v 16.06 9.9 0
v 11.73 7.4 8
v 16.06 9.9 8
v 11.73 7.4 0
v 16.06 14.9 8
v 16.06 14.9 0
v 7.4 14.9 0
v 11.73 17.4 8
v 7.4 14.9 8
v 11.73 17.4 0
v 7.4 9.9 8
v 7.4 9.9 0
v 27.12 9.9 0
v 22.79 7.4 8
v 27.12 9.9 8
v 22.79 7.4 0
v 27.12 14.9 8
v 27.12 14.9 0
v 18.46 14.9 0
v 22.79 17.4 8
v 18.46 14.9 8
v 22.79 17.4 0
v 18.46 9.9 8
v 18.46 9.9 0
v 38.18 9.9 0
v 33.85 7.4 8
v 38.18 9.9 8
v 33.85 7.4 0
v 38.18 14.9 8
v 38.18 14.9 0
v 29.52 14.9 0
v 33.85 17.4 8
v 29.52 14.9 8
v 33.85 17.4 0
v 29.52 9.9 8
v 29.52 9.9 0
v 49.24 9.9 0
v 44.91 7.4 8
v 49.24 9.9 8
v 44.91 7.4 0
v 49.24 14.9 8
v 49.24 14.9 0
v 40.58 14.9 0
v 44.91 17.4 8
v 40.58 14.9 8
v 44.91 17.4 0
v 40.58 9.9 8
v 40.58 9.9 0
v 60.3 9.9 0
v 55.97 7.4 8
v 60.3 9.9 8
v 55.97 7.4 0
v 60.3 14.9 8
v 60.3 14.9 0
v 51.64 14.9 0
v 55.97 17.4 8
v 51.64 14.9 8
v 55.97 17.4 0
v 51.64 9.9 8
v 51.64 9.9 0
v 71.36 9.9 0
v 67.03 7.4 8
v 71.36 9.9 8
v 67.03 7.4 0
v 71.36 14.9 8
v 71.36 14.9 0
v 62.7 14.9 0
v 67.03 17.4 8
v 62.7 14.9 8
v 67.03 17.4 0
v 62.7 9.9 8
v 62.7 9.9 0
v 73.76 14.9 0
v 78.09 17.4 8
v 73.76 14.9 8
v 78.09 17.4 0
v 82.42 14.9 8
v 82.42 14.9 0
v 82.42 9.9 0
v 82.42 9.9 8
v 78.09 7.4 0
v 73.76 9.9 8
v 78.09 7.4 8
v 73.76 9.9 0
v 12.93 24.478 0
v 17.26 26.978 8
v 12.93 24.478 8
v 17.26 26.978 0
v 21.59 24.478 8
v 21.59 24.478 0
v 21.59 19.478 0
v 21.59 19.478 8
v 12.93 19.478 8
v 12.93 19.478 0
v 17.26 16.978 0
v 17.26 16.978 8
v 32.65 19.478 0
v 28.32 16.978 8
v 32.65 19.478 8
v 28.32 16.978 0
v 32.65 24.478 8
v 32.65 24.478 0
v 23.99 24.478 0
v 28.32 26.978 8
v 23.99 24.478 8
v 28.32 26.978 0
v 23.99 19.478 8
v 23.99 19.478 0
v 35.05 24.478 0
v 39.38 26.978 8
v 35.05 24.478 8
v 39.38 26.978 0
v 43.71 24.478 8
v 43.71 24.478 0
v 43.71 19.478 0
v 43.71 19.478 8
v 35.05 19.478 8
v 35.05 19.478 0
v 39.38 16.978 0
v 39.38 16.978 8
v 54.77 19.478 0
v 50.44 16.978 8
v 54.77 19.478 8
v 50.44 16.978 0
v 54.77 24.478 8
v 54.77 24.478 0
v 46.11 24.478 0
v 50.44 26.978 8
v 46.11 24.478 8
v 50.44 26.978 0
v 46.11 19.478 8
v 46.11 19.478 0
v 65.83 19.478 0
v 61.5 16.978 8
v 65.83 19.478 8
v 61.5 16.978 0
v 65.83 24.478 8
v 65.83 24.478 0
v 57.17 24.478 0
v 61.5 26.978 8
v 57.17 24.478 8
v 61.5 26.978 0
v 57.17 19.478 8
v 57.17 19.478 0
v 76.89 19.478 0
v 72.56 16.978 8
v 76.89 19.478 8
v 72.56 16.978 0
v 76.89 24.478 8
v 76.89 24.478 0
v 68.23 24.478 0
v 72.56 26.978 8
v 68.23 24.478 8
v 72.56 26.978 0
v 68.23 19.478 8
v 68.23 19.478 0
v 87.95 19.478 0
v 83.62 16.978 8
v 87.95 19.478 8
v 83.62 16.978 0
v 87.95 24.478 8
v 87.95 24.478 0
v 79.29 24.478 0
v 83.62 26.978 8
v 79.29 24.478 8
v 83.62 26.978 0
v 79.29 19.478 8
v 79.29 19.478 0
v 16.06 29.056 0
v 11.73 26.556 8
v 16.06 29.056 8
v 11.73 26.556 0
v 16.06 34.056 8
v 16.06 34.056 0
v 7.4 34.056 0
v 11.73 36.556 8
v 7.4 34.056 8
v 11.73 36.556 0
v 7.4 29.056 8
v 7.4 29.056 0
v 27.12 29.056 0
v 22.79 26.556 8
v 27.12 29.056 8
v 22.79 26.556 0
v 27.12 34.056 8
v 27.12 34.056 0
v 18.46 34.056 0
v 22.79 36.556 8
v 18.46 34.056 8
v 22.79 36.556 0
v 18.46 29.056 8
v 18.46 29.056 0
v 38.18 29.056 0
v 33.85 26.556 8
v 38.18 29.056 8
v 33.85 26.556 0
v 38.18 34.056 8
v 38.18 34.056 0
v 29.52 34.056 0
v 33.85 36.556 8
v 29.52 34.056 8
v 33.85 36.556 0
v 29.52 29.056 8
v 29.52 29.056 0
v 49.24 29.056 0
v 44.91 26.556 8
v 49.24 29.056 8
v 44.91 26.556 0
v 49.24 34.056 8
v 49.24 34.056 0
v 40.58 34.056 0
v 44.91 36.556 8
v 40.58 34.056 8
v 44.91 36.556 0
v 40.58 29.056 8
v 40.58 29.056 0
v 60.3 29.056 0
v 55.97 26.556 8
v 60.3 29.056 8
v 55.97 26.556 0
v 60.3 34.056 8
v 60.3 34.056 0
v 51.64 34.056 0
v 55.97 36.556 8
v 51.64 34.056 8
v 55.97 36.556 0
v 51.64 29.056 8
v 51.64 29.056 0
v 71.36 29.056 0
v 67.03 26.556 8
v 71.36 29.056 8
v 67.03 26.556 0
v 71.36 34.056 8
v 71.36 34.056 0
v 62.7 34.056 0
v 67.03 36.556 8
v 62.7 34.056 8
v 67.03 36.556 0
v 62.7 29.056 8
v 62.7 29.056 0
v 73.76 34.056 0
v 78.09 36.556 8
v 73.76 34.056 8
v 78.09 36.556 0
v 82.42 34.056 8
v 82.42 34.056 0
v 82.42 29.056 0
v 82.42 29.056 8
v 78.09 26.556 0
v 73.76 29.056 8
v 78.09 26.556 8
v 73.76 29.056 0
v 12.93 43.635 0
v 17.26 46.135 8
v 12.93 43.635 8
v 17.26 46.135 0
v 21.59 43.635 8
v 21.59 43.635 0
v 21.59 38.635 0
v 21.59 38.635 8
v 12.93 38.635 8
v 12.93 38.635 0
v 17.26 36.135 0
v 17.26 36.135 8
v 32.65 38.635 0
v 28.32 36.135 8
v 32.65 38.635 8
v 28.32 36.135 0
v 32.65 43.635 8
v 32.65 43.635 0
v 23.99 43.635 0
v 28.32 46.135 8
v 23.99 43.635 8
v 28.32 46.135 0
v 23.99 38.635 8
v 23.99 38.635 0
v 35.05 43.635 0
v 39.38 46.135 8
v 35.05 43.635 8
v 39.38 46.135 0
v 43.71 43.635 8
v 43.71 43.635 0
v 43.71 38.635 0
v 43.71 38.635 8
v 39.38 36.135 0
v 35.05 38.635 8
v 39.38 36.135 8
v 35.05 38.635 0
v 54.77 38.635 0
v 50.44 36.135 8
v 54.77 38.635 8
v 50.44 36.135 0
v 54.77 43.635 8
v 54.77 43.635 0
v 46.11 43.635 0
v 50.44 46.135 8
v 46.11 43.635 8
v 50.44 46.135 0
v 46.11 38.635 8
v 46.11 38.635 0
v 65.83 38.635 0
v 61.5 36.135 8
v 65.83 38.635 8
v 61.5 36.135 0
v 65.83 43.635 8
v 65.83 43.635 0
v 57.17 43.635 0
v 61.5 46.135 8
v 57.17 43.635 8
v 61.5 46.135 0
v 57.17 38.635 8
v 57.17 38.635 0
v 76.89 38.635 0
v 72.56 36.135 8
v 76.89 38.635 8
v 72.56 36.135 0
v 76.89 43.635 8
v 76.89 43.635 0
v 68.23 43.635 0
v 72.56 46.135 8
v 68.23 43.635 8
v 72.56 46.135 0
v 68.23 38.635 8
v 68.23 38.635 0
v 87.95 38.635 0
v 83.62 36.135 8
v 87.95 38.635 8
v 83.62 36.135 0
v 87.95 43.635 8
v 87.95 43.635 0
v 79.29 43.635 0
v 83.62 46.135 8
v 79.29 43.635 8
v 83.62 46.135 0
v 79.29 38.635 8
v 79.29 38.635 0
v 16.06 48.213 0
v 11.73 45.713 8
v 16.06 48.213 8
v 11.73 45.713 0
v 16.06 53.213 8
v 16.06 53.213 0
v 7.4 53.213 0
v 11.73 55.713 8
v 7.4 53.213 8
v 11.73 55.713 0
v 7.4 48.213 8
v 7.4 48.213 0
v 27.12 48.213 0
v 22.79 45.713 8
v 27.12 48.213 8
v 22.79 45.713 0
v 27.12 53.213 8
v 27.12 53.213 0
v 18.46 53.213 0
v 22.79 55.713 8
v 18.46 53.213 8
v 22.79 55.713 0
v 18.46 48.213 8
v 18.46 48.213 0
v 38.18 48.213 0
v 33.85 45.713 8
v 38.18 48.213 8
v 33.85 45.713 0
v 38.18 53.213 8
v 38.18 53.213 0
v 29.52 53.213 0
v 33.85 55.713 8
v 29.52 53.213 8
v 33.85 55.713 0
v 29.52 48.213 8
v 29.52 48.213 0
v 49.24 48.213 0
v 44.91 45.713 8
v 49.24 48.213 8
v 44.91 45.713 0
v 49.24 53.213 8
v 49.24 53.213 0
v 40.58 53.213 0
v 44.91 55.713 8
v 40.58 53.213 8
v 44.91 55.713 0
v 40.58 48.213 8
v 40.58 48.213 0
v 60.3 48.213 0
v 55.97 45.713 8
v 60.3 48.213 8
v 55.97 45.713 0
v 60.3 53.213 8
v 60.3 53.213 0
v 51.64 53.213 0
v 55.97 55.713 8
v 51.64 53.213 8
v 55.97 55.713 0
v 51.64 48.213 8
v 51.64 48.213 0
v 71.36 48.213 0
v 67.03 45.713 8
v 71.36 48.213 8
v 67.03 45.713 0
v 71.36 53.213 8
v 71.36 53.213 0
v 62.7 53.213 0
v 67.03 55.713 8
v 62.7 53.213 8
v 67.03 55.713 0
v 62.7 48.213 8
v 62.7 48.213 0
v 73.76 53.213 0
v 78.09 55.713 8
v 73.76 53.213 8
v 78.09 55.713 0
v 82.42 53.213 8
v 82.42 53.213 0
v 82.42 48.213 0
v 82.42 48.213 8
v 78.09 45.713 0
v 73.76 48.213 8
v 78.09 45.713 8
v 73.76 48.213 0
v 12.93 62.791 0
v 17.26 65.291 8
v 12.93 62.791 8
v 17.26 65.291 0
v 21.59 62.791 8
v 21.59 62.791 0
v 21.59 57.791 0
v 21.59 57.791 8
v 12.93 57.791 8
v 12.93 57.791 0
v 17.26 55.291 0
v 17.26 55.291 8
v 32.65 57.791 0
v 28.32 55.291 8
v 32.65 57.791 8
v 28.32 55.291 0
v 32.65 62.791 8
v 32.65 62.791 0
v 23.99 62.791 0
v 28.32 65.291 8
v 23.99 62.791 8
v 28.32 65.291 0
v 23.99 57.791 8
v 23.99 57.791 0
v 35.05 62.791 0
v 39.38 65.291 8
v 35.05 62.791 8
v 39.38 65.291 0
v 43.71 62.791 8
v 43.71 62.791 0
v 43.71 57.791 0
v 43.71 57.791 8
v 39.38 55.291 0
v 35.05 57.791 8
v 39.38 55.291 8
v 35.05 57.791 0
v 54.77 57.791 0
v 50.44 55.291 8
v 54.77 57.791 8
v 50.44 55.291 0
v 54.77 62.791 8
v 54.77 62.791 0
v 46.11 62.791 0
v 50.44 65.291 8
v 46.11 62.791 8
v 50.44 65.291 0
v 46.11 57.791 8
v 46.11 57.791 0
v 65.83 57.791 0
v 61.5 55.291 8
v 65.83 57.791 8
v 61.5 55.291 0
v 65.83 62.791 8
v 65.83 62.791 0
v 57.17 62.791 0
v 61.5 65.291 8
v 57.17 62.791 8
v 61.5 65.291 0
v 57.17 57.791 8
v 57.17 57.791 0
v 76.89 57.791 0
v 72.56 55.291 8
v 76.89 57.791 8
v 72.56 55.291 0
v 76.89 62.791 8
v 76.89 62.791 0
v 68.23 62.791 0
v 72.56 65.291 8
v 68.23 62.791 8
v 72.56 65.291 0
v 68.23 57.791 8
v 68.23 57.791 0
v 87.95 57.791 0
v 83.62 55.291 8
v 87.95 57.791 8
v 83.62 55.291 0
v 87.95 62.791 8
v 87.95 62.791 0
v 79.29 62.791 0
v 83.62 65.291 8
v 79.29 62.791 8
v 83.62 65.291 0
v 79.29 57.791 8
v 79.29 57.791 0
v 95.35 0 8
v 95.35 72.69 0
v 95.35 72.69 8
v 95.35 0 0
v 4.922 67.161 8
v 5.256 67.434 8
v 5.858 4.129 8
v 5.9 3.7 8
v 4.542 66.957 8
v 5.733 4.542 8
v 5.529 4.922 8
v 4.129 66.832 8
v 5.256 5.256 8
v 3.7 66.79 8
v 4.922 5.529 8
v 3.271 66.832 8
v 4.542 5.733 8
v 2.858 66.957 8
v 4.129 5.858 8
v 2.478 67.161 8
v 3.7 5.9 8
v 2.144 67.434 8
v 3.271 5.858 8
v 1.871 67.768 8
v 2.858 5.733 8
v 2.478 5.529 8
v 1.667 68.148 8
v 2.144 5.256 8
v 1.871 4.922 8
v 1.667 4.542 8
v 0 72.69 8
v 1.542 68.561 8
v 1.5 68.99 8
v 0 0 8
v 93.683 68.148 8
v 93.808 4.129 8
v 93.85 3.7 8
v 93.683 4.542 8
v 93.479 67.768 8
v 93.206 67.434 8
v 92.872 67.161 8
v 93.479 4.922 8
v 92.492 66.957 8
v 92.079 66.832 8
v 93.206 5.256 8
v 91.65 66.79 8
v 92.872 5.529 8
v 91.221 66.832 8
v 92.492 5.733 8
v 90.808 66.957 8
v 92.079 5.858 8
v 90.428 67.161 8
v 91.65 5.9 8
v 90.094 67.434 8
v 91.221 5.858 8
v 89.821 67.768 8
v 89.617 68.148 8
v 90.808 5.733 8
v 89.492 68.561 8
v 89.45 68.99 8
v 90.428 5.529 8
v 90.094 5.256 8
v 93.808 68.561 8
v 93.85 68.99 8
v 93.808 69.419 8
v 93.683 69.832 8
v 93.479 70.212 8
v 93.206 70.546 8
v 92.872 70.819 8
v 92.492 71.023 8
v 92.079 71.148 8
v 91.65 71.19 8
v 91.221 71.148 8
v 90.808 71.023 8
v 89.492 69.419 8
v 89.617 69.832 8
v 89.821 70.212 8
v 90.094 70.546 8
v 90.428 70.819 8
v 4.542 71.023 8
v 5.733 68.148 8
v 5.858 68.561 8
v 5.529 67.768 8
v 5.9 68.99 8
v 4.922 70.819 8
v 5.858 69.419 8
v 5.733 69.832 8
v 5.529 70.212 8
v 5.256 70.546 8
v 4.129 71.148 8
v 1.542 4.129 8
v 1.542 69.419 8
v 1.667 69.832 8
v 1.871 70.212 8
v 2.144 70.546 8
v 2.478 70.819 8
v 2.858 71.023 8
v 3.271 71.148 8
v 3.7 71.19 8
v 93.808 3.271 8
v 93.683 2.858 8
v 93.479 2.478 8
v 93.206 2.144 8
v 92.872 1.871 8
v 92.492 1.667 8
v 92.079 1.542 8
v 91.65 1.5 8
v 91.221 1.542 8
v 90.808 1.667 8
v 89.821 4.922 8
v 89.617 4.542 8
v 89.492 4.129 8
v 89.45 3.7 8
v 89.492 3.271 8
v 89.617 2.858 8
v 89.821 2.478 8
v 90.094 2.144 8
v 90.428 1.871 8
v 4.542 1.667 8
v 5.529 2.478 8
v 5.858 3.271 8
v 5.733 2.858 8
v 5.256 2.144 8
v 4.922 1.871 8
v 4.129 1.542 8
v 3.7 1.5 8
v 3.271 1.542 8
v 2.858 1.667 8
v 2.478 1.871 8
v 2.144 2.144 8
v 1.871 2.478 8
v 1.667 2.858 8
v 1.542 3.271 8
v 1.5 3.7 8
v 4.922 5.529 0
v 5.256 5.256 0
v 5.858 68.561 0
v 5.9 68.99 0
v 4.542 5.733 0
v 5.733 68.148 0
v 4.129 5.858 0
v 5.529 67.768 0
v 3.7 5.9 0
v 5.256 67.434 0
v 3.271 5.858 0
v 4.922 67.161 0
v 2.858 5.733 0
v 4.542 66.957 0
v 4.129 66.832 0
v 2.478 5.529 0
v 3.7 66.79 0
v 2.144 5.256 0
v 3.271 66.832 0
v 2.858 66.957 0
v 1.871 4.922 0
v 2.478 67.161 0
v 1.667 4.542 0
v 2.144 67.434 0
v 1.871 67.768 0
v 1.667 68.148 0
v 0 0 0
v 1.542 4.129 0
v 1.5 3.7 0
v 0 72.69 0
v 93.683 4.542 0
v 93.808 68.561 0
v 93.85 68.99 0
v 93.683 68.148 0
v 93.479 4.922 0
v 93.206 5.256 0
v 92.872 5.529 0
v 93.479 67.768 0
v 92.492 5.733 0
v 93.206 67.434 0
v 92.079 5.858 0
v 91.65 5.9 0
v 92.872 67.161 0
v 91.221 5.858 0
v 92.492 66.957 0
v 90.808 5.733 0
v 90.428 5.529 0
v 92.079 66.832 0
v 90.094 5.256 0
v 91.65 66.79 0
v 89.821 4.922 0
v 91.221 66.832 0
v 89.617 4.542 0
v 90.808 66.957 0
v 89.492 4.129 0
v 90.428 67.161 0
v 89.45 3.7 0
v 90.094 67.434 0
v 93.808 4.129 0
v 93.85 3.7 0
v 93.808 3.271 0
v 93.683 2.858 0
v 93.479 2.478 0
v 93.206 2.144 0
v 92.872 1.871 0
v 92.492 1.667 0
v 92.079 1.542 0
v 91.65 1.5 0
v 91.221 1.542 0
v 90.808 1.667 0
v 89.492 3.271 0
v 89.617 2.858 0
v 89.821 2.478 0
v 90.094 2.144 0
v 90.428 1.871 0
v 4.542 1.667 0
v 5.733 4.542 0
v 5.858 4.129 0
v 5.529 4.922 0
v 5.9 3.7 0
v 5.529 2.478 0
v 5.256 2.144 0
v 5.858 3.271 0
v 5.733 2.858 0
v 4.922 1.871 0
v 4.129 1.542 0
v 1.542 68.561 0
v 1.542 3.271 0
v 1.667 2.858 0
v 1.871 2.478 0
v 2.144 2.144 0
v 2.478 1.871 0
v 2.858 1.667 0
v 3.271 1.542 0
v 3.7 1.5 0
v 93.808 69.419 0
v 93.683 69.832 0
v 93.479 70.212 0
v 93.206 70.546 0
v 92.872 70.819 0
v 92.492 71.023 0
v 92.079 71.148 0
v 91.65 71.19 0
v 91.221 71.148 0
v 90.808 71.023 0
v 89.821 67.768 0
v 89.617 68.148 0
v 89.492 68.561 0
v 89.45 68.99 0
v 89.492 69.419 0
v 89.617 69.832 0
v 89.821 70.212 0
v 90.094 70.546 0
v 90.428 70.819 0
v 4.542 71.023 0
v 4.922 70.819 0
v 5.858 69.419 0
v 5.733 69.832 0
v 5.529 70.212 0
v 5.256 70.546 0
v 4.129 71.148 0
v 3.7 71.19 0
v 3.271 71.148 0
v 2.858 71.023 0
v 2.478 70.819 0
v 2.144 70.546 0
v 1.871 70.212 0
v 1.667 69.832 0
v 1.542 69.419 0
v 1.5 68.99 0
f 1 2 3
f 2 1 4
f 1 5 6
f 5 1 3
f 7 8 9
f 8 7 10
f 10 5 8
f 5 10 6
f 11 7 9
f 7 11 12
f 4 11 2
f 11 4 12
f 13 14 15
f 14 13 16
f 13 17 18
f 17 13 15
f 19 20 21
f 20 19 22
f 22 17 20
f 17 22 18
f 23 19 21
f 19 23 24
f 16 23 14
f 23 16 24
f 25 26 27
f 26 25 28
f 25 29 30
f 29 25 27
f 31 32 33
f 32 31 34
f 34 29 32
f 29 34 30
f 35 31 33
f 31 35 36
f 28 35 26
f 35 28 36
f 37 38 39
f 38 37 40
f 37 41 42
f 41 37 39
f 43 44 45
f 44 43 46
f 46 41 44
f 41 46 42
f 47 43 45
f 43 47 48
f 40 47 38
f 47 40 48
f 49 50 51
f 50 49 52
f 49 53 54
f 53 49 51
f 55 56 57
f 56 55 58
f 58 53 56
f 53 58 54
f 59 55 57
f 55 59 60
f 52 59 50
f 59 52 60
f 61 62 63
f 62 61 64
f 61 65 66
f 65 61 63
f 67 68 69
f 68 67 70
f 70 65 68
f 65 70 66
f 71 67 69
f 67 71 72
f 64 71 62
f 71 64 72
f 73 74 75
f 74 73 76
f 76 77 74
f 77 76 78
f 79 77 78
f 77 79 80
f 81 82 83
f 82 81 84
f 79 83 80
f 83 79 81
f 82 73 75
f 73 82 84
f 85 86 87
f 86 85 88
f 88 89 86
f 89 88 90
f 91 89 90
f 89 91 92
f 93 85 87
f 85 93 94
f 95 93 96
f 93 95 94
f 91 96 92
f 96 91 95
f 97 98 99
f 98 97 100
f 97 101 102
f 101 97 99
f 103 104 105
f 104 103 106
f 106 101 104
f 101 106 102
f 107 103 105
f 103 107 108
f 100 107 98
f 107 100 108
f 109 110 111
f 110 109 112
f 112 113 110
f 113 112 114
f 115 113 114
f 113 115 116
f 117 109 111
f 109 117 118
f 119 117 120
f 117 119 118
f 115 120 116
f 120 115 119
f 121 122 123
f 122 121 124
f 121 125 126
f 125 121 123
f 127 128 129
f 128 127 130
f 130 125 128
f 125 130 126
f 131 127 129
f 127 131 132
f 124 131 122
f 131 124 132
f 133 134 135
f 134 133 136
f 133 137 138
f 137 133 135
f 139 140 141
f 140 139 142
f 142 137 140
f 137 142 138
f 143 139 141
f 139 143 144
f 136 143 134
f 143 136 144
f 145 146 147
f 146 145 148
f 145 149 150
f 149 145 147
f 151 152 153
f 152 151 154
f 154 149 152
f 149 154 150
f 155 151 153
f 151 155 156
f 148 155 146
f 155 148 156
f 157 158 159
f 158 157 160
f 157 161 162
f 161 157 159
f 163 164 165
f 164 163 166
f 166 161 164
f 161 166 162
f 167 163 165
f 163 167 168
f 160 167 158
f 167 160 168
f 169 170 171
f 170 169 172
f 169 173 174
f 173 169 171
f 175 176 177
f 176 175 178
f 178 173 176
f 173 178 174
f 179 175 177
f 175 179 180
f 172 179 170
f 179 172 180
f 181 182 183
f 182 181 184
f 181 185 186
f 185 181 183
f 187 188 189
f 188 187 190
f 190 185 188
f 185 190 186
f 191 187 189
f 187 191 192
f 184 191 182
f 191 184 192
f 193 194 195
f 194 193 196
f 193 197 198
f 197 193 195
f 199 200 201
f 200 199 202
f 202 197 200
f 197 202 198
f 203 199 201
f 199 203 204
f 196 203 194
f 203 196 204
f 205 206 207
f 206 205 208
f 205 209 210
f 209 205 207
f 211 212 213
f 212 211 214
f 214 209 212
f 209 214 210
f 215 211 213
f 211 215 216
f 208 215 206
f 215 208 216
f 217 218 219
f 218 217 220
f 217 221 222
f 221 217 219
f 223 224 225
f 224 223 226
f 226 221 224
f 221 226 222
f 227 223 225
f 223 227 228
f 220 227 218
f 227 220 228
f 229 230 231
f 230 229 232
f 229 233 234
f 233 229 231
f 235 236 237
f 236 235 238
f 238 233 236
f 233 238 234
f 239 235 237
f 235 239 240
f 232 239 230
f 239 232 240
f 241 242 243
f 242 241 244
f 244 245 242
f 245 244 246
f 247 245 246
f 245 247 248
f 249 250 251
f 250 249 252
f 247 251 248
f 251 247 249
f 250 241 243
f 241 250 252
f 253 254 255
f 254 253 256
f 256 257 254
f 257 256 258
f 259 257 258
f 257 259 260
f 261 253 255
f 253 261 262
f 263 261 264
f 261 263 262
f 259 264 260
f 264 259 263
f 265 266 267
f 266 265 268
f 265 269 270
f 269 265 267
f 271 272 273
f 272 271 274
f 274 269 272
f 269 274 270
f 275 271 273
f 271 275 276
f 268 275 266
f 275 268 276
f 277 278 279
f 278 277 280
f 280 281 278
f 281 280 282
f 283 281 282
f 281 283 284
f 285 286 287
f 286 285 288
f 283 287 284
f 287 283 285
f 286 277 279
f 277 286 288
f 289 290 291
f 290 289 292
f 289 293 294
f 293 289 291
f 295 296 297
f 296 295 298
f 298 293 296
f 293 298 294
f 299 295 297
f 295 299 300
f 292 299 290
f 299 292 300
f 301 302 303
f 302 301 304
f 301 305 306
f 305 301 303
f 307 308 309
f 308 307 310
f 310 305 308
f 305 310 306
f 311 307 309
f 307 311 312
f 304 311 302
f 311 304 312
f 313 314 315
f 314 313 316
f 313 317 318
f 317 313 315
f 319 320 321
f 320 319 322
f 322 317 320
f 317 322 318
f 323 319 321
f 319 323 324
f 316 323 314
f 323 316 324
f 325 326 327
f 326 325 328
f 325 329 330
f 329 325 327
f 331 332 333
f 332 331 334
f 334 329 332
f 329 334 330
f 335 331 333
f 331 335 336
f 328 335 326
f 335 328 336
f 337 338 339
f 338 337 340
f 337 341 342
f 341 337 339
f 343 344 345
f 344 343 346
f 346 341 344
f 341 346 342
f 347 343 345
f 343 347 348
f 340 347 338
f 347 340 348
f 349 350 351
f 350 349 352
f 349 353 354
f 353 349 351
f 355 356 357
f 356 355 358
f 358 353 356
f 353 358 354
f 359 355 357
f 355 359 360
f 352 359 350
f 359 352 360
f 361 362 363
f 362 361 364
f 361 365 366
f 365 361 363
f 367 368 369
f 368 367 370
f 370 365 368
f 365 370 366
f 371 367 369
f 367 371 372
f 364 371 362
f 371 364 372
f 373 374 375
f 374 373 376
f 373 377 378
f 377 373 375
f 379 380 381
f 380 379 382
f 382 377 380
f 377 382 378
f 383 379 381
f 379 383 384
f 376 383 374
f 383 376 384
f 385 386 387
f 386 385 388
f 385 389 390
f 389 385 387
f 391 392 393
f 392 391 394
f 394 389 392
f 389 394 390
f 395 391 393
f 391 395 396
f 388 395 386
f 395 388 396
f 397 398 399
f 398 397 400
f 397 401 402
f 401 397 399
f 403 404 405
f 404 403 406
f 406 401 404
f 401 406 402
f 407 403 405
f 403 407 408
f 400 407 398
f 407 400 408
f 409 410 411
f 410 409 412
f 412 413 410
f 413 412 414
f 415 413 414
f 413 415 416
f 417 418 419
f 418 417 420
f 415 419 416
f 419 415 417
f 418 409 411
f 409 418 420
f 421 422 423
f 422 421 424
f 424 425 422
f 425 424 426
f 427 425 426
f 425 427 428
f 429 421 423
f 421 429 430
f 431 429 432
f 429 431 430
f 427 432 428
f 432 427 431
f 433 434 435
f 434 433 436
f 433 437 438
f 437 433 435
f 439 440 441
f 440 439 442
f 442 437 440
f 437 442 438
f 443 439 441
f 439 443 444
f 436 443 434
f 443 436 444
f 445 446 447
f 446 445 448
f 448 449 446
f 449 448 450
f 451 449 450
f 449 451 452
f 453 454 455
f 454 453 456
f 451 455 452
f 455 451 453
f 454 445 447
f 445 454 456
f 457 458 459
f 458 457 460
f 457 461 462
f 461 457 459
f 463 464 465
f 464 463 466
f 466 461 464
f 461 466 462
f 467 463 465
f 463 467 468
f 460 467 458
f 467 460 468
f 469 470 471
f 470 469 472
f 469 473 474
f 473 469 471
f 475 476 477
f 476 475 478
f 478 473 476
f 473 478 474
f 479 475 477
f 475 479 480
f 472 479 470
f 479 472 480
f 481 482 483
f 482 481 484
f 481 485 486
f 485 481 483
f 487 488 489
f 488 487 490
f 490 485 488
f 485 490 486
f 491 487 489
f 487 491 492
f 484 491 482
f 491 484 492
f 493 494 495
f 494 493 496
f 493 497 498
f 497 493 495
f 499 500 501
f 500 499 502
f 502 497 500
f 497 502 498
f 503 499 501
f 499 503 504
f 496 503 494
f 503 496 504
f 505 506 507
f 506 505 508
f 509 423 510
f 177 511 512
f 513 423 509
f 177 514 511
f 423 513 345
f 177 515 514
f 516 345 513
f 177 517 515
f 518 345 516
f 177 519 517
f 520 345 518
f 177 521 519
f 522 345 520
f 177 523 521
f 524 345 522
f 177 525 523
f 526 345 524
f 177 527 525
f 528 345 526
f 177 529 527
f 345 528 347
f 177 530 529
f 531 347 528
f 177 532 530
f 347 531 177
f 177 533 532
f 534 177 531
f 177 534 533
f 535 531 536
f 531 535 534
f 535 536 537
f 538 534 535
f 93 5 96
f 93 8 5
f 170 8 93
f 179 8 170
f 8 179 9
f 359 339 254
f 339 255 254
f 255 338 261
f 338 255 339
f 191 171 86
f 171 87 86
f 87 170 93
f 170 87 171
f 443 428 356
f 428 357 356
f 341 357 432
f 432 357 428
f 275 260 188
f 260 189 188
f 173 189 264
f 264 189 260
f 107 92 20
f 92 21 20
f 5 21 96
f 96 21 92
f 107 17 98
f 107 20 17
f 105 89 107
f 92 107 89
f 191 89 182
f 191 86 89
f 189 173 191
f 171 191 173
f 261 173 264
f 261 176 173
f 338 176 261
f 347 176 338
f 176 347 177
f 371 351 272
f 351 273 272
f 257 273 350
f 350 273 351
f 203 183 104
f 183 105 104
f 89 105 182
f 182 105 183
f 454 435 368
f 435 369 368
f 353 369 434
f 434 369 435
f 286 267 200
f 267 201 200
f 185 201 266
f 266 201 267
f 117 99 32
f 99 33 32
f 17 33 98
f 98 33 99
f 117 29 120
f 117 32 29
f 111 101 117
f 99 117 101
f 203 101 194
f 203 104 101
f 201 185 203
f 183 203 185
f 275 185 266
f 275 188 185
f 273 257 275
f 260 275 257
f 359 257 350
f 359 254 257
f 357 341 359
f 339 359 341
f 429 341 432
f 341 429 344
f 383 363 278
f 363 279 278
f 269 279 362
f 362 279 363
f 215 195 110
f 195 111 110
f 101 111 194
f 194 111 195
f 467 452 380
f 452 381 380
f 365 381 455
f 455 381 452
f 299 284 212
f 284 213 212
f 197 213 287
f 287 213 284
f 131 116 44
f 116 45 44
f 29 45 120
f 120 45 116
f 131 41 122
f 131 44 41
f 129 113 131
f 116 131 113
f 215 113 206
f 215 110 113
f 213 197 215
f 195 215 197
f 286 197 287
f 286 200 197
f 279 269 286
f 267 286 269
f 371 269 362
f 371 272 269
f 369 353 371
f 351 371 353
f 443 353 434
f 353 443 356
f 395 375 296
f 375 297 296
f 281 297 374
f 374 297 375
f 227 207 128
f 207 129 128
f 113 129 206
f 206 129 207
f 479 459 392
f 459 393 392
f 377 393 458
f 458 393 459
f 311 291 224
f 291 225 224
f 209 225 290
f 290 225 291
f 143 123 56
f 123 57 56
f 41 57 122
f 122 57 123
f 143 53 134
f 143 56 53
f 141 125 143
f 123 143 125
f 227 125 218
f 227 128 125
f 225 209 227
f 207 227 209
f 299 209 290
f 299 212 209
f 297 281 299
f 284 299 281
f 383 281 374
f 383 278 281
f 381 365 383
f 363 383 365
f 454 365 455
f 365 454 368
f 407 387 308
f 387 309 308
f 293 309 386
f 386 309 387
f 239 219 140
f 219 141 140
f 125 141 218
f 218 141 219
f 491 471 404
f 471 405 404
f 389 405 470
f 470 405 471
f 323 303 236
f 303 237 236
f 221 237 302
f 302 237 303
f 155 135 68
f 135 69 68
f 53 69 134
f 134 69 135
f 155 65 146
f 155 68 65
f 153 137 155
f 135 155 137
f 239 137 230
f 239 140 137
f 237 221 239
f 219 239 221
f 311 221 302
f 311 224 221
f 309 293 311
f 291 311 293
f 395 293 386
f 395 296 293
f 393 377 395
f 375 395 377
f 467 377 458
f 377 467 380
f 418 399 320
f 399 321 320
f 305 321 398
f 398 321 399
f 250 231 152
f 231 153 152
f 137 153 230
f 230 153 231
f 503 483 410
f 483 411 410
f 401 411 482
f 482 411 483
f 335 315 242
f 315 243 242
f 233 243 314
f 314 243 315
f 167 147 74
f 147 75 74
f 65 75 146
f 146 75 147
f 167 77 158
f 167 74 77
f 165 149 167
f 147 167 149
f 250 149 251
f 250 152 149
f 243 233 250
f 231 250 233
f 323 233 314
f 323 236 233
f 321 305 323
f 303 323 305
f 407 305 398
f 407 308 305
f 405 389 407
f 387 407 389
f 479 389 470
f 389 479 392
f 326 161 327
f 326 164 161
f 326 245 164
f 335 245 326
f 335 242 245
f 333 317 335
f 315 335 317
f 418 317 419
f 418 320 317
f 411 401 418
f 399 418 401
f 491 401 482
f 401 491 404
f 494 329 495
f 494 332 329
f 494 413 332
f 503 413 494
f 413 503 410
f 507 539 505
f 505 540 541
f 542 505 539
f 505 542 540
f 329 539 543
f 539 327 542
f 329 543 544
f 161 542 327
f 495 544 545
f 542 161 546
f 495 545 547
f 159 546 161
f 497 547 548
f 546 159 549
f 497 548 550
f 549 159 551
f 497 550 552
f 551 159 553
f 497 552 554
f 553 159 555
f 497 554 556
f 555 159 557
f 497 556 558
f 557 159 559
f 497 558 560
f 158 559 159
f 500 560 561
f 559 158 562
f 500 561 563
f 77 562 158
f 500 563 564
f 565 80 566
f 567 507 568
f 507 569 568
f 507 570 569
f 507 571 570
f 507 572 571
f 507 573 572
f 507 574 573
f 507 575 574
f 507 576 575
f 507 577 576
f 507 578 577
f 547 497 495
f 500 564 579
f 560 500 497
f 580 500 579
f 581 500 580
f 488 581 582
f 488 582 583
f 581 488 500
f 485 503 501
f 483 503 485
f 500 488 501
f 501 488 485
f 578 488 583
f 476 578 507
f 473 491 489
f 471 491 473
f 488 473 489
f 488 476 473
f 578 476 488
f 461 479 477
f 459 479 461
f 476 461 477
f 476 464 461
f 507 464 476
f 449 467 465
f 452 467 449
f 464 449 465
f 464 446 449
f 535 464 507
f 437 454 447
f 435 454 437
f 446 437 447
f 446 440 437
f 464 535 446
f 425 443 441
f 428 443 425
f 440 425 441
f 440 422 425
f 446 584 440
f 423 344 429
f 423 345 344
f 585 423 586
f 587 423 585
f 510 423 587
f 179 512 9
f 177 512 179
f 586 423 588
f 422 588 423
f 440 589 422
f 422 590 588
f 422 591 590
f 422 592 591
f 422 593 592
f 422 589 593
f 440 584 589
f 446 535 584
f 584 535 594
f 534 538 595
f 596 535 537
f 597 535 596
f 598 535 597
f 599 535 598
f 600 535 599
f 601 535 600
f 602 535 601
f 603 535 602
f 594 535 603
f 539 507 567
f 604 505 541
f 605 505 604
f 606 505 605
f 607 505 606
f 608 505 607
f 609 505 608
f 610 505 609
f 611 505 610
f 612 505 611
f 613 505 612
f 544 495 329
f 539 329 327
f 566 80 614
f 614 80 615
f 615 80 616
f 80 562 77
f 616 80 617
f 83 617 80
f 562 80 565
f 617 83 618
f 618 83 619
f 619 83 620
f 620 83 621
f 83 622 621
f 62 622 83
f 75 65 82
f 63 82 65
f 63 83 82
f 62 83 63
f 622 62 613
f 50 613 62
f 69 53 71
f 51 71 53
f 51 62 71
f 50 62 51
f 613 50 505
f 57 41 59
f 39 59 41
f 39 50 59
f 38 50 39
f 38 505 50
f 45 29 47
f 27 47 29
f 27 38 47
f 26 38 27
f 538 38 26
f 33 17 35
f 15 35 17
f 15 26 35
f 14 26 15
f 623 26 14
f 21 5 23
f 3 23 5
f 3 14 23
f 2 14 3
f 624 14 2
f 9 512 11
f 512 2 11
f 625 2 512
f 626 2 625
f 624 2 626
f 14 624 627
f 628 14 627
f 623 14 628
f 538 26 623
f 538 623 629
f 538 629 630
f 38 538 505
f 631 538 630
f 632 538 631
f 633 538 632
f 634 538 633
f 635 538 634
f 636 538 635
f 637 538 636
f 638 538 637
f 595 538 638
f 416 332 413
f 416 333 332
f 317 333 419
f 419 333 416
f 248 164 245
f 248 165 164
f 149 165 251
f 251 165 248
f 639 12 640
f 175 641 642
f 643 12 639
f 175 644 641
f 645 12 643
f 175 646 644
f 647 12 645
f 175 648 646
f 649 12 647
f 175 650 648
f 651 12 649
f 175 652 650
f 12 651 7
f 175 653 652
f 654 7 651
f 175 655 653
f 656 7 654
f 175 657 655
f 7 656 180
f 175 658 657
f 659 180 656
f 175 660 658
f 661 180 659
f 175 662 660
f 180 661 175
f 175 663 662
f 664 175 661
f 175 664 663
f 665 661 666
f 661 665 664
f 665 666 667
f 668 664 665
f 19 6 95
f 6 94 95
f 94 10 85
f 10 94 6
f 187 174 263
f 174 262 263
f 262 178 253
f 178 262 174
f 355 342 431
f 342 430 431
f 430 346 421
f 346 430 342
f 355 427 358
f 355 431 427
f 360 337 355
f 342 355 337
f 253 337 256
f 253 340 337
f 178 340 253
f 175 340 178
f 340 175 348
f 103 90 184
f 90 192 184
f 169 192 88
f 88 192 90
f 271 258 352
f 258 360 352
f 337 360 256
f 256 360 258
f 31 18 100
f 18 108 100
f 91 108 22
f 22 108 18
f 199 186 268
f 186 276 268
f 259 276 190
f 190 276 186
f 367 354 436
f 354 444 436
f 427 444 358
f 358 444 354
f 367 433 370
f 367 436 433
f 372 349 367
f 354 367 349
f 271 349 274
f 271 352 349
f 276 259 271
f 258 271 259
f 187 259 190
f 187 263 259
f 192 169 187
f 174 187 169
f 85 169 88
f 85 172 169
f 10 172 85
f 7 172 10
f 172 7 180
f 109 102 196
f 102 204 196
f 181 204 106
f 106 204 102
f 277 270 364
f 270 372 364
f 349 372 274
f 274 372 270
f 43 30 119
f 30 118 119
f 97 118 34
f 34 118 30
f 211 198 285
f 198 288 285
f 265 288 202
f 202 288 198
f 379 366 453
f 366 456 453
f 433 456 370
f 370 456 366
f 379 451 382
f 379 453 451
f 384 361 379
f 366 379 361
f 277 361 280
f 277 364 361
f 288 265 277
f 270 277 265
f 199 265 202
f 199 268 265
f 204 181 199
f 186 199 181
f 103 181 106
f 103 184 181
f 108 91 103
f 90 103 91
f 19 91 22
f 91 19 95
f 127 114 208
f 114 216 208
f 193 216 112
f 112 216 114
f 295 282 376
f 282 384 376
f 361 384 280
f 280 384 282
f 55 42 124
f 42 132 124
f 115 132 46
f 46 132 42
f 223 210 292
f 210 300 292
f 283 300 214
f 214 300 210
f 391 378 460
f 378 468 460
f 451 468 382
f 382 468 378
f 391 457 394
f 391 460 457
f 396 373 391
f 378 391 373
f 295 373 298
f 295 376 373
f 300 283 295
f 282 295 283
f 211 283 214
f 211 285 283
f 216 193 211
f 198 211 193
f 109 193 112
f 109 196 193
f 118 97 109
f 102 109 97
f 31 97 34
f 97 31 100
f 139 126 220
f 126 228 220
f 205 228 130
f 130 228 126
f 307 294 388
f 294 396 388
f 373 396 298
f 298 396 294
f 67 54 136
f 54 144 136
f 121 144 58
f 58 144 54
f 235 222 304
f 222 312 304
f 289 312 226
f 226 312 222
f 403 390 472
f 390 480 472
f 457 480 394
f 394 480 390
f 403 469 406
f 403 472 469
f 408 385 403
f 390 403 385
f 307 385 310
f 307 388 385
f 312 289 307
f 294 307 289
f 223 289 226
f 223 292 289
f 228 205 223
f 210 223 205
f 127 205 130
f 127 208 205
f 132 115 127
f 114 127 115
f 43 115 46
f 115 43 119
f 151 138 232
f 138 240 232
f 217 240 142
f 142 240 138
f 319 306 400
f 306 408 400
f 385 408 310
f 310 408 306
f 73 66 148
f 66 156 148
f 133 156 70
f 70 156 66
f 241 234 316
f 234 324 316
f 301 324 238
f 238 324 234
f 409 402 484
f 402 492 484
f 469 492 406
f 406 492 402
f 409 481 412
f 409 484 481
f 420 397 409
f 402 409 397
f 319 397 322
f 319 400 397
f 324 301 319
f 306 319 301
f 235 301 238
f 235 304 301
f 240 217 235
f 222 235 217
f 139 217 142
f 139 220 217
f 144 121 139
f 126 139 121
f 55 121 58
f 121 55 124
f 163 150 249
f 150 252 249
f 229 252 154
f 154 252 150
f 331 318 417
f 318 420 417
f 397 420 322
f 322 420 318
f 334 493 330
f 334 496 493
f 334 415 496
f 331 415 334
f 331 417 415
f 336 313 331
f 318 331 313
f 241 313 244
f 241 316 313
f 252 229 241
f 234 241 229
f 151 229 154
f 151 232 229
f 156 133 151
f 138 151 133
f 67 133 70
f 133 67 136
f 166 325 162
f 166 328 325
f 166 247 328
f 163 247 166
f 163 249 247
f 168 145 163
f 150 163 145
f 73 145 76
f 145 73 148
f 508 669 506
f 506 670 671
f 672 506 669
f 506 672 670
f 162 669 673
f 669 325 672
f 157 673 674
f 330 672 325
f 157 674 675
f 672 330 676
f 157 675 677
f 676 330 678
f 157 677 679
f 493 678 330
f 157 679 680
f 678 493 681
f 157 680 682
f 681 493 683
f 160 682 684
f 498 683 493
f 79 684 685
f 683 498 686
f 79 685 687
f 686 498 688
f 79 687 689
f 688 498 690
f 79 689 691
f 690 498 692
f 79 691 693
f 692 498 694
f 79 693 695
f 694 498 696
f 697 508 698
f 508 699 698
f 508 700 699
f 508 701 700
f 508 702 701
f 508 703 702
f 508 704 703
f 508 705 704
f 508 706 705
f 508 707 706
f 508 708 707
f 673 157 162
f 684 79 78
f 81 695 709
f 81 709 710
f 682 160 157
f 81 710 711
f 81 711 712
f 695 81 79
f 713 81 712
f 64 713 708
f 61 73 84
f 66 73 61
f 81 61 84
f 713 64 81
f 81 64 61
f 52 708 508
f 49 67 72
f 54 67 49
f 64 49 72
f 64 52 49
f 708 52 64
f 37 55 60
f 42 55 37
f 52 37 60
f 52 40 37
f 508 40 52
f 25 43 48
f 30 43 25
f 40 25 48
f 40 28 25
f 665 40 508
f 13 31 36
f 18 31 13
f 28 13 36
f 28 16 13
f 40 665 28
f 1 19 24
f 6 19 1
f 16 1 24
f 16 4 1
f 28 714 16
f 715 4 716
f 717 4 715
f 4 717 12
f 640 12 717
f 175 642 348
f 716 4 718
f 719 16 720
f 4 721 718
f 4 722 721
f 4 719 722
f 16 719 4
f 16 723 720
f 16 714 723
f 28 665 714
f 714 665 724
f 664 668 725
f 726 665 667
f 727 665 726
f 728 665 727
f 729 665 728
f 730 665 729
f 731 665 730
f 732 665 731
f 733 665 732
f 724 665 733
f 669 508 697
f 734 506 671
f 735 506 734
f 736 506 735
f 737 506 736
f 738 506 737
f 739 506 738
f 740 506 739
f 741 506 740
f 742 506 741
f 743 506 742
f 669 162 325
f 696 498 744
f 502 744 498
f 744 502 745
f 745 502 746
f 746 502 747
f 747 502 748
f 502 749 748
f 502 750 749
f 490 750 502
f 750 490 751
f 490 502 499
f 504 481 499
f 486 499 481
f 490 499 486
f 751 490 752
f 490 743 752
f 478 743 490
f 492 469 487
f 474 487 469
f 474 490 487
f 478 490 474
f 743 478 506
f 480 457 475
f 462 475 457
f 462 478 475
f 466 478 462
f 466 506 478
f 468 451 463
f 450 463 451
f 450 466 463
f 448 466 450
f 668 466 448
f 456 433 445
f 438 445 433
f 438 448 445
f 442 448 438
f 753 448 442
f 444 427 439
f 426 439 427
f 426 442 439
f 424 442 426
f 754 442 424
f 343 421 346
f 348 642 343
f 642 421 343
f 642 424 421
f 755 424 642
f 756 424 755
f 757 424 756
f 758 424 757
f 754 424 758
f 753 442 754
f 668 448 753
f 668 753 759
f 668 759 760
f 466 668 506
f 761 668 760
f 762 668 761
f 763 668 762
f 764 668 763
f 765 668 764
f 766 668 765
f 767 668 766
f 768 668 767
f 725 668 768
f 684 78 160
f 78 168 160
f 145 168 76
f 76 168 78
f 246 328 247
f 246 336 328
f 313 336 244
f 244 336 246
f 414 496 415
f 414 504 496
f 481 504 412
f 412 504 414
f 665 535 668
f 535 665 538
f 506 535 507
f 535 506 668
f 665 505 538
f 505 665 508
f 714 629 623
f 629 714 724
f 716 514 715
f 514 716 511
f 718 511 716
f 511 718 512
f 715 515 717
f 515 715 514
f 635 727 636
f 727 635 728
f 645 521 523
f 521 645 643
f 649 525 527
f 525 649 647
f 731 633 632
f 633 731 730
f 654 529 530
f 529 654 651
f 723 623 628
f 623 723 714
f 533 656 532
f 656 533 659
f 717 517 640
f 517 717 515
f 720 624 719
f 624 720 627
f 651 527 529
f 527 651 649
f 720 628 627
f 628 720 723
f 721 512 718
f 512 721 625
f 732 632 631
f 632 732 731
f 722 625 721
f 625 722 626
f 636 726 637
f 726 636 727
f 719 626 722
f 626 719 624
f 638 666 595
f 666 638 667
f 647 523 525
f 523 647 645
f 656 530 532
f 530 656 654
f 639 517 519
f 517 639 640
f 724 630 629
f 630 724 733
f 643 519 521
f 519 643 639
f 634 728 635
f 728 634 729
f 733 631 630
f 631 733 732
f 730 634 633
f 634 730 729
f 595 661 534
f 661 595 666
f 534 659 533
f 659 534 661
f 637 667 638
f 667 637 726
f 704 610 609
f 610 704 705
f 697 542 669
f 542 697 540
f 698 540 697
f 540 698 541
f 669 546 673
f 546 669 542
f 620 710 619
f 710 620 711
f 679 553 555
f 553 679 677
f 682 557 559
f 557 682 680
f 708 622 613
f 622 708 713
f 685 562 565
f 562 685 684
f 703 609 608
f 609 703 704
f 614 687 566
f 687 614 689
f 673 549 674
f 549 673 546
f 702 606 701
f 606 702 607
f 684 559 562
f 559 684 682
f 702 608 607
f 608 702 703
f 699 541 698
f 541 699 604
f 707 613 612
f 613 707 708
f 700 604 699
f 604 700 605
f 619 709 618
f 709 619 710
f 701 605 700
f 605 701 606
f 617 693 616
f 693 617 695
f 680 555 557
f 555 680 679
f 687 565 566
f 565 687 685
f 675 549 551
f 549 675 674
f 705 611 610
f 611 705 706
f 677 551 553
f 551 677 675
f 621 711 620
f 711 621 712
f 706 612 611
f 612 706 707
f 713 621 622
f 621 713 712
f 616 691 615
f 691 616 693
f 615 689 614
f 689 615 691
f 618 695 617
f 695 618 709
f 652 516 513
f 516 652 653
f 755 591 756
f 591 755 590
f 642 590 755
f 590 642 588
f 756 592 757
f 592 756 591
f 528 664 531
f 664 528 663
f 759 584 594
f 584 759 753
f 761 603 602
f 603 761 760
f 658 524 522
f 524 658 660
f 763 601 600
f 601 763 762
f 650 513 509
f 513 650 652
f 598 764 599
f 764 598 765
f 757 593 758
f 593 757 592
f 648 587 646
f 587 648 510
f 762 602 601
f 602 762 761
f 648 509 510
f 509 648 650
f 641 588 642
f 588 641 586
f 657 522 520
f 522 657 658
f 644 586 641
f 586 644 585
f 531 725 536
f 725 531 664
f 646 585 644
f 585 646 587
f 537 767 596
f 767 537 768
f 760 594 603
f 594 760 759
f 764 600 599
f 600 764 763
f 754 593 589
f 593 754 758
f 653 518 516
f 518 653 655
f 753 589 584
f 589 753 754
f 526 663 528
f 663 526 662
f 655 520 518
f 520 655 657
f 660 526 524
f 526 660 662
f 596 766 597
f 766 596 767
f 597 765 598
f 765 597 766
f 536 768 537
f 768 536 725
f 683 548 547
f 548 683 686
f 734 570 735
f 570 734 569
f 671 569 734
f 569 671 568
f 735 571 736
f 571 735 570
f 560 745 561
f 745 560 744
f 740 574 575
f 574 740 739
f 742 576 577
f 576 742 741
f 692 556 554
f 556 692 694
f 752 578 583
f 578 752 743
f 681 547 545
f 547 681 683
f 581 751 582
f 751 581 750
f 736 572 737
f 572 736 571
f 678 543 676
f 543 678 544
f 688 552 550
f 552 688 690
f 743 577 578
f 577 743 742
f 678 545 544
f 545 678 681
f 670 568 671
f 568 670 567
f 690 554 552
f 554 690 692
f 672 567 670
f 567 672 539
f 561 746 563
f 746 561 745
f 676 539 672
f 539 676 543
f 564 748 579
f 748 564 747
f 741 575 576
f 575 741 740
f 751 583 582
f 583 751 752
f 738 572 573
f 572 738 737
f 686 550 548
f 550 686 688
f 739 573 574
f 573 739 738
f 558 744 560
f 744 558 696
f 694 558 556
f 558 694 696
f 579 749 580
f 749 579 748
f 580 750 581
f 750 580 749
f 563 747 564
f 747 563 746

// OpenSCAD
$fn = 32;

// ----------------------------------------------------------------------
// Honeycomb panel: 95.35 x 72.69 mm, 42 cells of 10 mm
// ----------------------------------------------------------------------

// --- parameters (mm) ---
panel_w = 95.35;          // panel width
panel_d = 72.69;          // panel depth
thick = 8;                // panel thickness
cell_r = 5;               // hex cell circumradius
pitch = 11.06;            // hex cell pitch (centre to centre)
web = 2.4;                // web between the cells
columns = 7;              // columns of cells
rows = 6;                 // rows of cells
cell_count = 42;          // total cells
shift_x = 11.73;          // first cell offset in x
shift_y = 12.4;           // first cell offset in y
mount_d = 4.4;            // corner mounting holes
hole_off = 3.7;           // mounting hole offset from the corners

difference() {
  union() {
    cube([panel_w, panel_d, thick]);
  }
  /* hexagonal cells, point-up, cut right through the plate */
  for (row = [0 : rows - 1]) {
    for (col = [0 : columns - 1]) {
      translate([shift_x + col * pitch + (row % 2) * pitch / 2, shift_y + row * pitch * 0.866025, -2.5]) rotate([0, 0, 30]) cylinder(h = thick + 5, d = 2 * cell_r, $fn = 6);
    }
  }
  /* corner mounting holes, clear of the outer cell web */
  translate([3.7, 3.7, -2.5]) cylinder(h = thick + 5, d = mount_d);
  translate([91.65, 3.7, -2.5]) cylinder(h = thick + 5, d = mount_d);
  translate([3.7, 68.99, -2.5]) cylinder(h = thick + 5, d = mount_d);
  translate([91.65, 68.99, -2.5]) cylinder(h = thick + 5, d = mount_d);
}
